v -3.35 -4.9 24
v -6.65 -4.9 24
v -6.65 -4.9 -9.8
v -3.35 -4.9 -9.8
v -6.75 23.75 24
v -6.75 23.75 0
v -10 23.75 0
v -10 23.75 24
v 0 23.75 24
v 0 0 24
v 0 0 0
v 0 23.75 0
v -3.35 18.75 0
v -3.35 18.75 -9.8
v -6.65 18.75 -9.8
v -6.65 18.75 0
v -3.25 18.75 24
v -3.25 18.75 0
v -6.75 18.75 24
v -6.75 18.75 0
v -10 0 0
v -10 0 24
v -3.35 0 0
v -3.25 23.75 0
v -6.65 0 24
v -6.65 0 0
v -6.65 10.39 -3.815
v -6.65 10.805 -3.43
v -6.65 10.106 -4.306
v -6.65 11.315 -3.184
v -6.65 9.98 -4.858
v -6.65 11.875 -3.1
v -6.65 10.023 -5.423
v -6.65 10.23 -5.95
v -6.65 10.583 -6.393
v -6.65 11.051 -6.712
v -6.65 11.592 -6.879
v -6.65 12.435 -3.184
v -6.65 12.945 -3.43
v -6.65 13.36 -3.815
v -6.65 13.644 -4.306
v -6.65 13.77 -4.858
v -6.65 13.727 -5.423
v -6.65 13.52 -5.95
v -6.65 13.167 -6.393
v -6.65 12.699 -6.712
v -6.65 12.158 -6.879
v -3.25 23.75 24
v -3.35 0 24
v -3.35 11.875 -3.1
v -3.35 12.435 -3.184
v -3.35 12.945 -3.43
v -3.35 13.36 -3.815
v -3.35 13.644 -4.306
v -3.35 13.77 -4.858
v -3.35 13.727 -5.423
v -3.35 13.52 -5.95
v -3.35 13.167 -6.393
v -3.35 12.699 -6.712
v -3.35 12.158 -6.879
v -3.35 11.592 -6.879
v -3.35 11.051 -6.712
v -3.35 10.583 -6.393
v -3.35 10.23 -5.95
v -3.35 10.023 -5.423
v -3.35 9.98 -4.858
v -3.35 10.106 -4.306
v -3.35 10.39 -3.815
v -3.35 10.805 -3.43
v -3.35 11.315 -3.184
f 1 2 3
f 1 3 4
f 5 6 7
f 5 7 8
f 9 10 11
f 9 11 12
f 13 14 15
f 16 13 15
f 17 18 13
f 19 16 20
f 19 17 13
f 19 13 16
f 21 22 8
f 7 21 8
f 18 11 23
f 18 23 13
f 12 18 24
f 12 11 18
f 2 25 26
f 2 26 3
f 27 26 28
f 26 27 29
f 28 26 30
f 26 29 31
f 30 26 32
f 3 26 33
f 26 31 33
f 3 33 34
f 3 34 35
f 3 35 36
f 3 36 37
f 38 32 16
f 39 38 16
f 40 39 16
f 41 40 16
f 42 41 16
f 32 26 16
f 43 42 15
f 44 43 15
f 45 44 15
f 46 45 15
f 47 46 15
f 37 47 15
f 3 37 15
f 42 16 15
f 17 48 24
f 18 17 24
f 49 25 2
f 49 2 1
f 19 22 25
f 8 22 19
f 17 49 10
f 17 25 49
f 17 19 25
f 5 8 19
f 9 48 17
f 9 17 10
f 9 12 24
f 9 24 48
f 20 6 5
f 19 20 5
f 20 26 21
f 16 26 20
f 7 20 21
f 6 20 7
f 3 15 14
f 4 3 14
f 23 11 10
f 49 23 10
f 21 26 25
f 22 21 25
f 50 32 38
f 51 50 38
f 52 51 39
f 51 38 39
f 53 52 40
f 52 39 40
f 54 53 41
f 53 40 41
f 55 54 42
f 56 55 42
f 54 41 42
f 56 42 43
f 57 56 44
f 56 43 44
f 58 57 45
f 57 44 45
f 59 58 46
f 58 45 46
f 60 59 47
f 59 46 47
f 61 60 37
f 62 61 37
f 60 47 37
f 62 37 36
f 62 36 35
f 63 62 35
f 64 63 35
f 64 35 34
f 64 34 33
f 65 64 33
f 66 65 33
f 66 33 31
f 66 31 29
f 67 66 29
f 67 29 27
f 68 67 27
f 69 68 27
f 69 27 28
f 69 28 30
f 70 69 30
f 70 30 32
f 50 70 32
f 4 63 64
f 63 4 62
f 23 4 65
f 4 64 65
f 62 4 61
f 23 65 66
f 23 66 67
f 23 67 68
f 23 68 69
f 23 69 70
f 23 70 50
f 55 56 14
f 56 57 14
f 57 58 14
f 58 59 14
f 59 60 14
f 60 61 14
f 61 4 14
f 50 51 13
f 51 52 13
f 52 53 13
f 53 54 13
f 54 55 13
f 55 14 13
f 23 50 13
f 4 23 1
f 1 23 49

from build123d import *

# Parameters (mm, degrees)
SKETCH1_W           = 23.75
SKETCH1_H           = 24
BOSS_EXTRUDE1_DEPTH = 10
SKETCH2_W           = 3.3
SKETCH2_H           = 9.8
BOSS_EXTRUDE2_DEPTH = 23.75
SKETCH3_W           = 3.3
SKETCH3_H           = 17.3
SKETCH3_H_2         = 3.35
SKETCH3_H_3         = 13.15
BOSS_EXTRUDE3_DEPTH = 4.9
CUT_EXTRUDE1_REACH  = 36.413
SKETCH4_R           = 1.9
SKETCH5_W           = 3.5
SKETCH5_H           = 17.5
SKETCH5_H_2         = 3.25
SKETCH5_H_3         = 13.05
CUT_EXTRUDE2_DEPTH  = 5


with BuildPart() as part:
    # Sketch1 → Boss-Extrude1 (new body)
    with BuildSketch(Plane.YZ):
        with Locations((11.875, 12)):
            Rectangle(SKETCH1_W, SKETCH1_H)
    extrude(amount=-BOSS_EXTRUDE1_DEPTH)

    # Sketch2 → Boss-Extrude2 (add, through all)
    with BuildSketch(Plane.XZ):
        with Locations((-5, -4.9)):
            Rectangle(SKETCH2_W, SKETCH2_H)
    extrude(amount=-BOSS_EXTRUDE2_DEPTH)

    # Sketch3 → Boss-Extrude3 (add)
    with BuildSketch(Plane.XZ):
        with Locations((-5, 12)):
            Rectangle(SKETCH3_W, SKETCH3_H)
        with Locations((-5, 22.325)):
            Rectangle(SKETCH3_W, SKETCH3_H_2)
        with Locations((-5, -3.225)):
            Rectangle(SKETCH3_W, SKETCH3_H_3)
    extrude(amount=BOSS_EXTRUDE3_DEPTH)

    # Sketch4 → Cut-Extrude1 (cut, up to next)
    with BuildSketch(Plane(origin=(-6.65, 0, 0), x_dir=(0, -1, 0), z_dir=(-1, 0, 0)), mode=Mode.PRIVATE) as cut_extrude1_sk1:
        with Locations(Location((-11.875, -5, 0), (0, 0, 90))):
            Circle(SKETCH4_R)
    cut_extrude1_tool1 = extrude(cut_extrude1_sk1.sketch, amount=-CUT_EXTRUDE1_REACH, mode=Mode.PRIVATE) & part.part
    add(cut_extrude1_tool1.solids().sort_by_distance((-6.65, 11.875, -5))[0], mode=Mode.SUBTRACT)

    # Sketch5 → Cut-Extrude2 (cut)
    with BuildSketch(Plane(origin=(0, 23.75, 0), x_dir=(-1, 0, 0), z_dir=(0, 1, 0))):
        with Locations((5, 12)):
            Rectangle(SKETCH5_W, SKETCH5_H)
        with Locations((5, 22.375)):
            Rectangle(SKETCH5_W, SKETCH5_H_2)
        with Locations((5, -3.275)):
            Rectangle(SKETCH5_W, SKETCH5_H_3)
    extrude(amount=-CUT_EXTRUDE2_DEPTH, mode=Mode.SUBTRACT)


solid = part.part
